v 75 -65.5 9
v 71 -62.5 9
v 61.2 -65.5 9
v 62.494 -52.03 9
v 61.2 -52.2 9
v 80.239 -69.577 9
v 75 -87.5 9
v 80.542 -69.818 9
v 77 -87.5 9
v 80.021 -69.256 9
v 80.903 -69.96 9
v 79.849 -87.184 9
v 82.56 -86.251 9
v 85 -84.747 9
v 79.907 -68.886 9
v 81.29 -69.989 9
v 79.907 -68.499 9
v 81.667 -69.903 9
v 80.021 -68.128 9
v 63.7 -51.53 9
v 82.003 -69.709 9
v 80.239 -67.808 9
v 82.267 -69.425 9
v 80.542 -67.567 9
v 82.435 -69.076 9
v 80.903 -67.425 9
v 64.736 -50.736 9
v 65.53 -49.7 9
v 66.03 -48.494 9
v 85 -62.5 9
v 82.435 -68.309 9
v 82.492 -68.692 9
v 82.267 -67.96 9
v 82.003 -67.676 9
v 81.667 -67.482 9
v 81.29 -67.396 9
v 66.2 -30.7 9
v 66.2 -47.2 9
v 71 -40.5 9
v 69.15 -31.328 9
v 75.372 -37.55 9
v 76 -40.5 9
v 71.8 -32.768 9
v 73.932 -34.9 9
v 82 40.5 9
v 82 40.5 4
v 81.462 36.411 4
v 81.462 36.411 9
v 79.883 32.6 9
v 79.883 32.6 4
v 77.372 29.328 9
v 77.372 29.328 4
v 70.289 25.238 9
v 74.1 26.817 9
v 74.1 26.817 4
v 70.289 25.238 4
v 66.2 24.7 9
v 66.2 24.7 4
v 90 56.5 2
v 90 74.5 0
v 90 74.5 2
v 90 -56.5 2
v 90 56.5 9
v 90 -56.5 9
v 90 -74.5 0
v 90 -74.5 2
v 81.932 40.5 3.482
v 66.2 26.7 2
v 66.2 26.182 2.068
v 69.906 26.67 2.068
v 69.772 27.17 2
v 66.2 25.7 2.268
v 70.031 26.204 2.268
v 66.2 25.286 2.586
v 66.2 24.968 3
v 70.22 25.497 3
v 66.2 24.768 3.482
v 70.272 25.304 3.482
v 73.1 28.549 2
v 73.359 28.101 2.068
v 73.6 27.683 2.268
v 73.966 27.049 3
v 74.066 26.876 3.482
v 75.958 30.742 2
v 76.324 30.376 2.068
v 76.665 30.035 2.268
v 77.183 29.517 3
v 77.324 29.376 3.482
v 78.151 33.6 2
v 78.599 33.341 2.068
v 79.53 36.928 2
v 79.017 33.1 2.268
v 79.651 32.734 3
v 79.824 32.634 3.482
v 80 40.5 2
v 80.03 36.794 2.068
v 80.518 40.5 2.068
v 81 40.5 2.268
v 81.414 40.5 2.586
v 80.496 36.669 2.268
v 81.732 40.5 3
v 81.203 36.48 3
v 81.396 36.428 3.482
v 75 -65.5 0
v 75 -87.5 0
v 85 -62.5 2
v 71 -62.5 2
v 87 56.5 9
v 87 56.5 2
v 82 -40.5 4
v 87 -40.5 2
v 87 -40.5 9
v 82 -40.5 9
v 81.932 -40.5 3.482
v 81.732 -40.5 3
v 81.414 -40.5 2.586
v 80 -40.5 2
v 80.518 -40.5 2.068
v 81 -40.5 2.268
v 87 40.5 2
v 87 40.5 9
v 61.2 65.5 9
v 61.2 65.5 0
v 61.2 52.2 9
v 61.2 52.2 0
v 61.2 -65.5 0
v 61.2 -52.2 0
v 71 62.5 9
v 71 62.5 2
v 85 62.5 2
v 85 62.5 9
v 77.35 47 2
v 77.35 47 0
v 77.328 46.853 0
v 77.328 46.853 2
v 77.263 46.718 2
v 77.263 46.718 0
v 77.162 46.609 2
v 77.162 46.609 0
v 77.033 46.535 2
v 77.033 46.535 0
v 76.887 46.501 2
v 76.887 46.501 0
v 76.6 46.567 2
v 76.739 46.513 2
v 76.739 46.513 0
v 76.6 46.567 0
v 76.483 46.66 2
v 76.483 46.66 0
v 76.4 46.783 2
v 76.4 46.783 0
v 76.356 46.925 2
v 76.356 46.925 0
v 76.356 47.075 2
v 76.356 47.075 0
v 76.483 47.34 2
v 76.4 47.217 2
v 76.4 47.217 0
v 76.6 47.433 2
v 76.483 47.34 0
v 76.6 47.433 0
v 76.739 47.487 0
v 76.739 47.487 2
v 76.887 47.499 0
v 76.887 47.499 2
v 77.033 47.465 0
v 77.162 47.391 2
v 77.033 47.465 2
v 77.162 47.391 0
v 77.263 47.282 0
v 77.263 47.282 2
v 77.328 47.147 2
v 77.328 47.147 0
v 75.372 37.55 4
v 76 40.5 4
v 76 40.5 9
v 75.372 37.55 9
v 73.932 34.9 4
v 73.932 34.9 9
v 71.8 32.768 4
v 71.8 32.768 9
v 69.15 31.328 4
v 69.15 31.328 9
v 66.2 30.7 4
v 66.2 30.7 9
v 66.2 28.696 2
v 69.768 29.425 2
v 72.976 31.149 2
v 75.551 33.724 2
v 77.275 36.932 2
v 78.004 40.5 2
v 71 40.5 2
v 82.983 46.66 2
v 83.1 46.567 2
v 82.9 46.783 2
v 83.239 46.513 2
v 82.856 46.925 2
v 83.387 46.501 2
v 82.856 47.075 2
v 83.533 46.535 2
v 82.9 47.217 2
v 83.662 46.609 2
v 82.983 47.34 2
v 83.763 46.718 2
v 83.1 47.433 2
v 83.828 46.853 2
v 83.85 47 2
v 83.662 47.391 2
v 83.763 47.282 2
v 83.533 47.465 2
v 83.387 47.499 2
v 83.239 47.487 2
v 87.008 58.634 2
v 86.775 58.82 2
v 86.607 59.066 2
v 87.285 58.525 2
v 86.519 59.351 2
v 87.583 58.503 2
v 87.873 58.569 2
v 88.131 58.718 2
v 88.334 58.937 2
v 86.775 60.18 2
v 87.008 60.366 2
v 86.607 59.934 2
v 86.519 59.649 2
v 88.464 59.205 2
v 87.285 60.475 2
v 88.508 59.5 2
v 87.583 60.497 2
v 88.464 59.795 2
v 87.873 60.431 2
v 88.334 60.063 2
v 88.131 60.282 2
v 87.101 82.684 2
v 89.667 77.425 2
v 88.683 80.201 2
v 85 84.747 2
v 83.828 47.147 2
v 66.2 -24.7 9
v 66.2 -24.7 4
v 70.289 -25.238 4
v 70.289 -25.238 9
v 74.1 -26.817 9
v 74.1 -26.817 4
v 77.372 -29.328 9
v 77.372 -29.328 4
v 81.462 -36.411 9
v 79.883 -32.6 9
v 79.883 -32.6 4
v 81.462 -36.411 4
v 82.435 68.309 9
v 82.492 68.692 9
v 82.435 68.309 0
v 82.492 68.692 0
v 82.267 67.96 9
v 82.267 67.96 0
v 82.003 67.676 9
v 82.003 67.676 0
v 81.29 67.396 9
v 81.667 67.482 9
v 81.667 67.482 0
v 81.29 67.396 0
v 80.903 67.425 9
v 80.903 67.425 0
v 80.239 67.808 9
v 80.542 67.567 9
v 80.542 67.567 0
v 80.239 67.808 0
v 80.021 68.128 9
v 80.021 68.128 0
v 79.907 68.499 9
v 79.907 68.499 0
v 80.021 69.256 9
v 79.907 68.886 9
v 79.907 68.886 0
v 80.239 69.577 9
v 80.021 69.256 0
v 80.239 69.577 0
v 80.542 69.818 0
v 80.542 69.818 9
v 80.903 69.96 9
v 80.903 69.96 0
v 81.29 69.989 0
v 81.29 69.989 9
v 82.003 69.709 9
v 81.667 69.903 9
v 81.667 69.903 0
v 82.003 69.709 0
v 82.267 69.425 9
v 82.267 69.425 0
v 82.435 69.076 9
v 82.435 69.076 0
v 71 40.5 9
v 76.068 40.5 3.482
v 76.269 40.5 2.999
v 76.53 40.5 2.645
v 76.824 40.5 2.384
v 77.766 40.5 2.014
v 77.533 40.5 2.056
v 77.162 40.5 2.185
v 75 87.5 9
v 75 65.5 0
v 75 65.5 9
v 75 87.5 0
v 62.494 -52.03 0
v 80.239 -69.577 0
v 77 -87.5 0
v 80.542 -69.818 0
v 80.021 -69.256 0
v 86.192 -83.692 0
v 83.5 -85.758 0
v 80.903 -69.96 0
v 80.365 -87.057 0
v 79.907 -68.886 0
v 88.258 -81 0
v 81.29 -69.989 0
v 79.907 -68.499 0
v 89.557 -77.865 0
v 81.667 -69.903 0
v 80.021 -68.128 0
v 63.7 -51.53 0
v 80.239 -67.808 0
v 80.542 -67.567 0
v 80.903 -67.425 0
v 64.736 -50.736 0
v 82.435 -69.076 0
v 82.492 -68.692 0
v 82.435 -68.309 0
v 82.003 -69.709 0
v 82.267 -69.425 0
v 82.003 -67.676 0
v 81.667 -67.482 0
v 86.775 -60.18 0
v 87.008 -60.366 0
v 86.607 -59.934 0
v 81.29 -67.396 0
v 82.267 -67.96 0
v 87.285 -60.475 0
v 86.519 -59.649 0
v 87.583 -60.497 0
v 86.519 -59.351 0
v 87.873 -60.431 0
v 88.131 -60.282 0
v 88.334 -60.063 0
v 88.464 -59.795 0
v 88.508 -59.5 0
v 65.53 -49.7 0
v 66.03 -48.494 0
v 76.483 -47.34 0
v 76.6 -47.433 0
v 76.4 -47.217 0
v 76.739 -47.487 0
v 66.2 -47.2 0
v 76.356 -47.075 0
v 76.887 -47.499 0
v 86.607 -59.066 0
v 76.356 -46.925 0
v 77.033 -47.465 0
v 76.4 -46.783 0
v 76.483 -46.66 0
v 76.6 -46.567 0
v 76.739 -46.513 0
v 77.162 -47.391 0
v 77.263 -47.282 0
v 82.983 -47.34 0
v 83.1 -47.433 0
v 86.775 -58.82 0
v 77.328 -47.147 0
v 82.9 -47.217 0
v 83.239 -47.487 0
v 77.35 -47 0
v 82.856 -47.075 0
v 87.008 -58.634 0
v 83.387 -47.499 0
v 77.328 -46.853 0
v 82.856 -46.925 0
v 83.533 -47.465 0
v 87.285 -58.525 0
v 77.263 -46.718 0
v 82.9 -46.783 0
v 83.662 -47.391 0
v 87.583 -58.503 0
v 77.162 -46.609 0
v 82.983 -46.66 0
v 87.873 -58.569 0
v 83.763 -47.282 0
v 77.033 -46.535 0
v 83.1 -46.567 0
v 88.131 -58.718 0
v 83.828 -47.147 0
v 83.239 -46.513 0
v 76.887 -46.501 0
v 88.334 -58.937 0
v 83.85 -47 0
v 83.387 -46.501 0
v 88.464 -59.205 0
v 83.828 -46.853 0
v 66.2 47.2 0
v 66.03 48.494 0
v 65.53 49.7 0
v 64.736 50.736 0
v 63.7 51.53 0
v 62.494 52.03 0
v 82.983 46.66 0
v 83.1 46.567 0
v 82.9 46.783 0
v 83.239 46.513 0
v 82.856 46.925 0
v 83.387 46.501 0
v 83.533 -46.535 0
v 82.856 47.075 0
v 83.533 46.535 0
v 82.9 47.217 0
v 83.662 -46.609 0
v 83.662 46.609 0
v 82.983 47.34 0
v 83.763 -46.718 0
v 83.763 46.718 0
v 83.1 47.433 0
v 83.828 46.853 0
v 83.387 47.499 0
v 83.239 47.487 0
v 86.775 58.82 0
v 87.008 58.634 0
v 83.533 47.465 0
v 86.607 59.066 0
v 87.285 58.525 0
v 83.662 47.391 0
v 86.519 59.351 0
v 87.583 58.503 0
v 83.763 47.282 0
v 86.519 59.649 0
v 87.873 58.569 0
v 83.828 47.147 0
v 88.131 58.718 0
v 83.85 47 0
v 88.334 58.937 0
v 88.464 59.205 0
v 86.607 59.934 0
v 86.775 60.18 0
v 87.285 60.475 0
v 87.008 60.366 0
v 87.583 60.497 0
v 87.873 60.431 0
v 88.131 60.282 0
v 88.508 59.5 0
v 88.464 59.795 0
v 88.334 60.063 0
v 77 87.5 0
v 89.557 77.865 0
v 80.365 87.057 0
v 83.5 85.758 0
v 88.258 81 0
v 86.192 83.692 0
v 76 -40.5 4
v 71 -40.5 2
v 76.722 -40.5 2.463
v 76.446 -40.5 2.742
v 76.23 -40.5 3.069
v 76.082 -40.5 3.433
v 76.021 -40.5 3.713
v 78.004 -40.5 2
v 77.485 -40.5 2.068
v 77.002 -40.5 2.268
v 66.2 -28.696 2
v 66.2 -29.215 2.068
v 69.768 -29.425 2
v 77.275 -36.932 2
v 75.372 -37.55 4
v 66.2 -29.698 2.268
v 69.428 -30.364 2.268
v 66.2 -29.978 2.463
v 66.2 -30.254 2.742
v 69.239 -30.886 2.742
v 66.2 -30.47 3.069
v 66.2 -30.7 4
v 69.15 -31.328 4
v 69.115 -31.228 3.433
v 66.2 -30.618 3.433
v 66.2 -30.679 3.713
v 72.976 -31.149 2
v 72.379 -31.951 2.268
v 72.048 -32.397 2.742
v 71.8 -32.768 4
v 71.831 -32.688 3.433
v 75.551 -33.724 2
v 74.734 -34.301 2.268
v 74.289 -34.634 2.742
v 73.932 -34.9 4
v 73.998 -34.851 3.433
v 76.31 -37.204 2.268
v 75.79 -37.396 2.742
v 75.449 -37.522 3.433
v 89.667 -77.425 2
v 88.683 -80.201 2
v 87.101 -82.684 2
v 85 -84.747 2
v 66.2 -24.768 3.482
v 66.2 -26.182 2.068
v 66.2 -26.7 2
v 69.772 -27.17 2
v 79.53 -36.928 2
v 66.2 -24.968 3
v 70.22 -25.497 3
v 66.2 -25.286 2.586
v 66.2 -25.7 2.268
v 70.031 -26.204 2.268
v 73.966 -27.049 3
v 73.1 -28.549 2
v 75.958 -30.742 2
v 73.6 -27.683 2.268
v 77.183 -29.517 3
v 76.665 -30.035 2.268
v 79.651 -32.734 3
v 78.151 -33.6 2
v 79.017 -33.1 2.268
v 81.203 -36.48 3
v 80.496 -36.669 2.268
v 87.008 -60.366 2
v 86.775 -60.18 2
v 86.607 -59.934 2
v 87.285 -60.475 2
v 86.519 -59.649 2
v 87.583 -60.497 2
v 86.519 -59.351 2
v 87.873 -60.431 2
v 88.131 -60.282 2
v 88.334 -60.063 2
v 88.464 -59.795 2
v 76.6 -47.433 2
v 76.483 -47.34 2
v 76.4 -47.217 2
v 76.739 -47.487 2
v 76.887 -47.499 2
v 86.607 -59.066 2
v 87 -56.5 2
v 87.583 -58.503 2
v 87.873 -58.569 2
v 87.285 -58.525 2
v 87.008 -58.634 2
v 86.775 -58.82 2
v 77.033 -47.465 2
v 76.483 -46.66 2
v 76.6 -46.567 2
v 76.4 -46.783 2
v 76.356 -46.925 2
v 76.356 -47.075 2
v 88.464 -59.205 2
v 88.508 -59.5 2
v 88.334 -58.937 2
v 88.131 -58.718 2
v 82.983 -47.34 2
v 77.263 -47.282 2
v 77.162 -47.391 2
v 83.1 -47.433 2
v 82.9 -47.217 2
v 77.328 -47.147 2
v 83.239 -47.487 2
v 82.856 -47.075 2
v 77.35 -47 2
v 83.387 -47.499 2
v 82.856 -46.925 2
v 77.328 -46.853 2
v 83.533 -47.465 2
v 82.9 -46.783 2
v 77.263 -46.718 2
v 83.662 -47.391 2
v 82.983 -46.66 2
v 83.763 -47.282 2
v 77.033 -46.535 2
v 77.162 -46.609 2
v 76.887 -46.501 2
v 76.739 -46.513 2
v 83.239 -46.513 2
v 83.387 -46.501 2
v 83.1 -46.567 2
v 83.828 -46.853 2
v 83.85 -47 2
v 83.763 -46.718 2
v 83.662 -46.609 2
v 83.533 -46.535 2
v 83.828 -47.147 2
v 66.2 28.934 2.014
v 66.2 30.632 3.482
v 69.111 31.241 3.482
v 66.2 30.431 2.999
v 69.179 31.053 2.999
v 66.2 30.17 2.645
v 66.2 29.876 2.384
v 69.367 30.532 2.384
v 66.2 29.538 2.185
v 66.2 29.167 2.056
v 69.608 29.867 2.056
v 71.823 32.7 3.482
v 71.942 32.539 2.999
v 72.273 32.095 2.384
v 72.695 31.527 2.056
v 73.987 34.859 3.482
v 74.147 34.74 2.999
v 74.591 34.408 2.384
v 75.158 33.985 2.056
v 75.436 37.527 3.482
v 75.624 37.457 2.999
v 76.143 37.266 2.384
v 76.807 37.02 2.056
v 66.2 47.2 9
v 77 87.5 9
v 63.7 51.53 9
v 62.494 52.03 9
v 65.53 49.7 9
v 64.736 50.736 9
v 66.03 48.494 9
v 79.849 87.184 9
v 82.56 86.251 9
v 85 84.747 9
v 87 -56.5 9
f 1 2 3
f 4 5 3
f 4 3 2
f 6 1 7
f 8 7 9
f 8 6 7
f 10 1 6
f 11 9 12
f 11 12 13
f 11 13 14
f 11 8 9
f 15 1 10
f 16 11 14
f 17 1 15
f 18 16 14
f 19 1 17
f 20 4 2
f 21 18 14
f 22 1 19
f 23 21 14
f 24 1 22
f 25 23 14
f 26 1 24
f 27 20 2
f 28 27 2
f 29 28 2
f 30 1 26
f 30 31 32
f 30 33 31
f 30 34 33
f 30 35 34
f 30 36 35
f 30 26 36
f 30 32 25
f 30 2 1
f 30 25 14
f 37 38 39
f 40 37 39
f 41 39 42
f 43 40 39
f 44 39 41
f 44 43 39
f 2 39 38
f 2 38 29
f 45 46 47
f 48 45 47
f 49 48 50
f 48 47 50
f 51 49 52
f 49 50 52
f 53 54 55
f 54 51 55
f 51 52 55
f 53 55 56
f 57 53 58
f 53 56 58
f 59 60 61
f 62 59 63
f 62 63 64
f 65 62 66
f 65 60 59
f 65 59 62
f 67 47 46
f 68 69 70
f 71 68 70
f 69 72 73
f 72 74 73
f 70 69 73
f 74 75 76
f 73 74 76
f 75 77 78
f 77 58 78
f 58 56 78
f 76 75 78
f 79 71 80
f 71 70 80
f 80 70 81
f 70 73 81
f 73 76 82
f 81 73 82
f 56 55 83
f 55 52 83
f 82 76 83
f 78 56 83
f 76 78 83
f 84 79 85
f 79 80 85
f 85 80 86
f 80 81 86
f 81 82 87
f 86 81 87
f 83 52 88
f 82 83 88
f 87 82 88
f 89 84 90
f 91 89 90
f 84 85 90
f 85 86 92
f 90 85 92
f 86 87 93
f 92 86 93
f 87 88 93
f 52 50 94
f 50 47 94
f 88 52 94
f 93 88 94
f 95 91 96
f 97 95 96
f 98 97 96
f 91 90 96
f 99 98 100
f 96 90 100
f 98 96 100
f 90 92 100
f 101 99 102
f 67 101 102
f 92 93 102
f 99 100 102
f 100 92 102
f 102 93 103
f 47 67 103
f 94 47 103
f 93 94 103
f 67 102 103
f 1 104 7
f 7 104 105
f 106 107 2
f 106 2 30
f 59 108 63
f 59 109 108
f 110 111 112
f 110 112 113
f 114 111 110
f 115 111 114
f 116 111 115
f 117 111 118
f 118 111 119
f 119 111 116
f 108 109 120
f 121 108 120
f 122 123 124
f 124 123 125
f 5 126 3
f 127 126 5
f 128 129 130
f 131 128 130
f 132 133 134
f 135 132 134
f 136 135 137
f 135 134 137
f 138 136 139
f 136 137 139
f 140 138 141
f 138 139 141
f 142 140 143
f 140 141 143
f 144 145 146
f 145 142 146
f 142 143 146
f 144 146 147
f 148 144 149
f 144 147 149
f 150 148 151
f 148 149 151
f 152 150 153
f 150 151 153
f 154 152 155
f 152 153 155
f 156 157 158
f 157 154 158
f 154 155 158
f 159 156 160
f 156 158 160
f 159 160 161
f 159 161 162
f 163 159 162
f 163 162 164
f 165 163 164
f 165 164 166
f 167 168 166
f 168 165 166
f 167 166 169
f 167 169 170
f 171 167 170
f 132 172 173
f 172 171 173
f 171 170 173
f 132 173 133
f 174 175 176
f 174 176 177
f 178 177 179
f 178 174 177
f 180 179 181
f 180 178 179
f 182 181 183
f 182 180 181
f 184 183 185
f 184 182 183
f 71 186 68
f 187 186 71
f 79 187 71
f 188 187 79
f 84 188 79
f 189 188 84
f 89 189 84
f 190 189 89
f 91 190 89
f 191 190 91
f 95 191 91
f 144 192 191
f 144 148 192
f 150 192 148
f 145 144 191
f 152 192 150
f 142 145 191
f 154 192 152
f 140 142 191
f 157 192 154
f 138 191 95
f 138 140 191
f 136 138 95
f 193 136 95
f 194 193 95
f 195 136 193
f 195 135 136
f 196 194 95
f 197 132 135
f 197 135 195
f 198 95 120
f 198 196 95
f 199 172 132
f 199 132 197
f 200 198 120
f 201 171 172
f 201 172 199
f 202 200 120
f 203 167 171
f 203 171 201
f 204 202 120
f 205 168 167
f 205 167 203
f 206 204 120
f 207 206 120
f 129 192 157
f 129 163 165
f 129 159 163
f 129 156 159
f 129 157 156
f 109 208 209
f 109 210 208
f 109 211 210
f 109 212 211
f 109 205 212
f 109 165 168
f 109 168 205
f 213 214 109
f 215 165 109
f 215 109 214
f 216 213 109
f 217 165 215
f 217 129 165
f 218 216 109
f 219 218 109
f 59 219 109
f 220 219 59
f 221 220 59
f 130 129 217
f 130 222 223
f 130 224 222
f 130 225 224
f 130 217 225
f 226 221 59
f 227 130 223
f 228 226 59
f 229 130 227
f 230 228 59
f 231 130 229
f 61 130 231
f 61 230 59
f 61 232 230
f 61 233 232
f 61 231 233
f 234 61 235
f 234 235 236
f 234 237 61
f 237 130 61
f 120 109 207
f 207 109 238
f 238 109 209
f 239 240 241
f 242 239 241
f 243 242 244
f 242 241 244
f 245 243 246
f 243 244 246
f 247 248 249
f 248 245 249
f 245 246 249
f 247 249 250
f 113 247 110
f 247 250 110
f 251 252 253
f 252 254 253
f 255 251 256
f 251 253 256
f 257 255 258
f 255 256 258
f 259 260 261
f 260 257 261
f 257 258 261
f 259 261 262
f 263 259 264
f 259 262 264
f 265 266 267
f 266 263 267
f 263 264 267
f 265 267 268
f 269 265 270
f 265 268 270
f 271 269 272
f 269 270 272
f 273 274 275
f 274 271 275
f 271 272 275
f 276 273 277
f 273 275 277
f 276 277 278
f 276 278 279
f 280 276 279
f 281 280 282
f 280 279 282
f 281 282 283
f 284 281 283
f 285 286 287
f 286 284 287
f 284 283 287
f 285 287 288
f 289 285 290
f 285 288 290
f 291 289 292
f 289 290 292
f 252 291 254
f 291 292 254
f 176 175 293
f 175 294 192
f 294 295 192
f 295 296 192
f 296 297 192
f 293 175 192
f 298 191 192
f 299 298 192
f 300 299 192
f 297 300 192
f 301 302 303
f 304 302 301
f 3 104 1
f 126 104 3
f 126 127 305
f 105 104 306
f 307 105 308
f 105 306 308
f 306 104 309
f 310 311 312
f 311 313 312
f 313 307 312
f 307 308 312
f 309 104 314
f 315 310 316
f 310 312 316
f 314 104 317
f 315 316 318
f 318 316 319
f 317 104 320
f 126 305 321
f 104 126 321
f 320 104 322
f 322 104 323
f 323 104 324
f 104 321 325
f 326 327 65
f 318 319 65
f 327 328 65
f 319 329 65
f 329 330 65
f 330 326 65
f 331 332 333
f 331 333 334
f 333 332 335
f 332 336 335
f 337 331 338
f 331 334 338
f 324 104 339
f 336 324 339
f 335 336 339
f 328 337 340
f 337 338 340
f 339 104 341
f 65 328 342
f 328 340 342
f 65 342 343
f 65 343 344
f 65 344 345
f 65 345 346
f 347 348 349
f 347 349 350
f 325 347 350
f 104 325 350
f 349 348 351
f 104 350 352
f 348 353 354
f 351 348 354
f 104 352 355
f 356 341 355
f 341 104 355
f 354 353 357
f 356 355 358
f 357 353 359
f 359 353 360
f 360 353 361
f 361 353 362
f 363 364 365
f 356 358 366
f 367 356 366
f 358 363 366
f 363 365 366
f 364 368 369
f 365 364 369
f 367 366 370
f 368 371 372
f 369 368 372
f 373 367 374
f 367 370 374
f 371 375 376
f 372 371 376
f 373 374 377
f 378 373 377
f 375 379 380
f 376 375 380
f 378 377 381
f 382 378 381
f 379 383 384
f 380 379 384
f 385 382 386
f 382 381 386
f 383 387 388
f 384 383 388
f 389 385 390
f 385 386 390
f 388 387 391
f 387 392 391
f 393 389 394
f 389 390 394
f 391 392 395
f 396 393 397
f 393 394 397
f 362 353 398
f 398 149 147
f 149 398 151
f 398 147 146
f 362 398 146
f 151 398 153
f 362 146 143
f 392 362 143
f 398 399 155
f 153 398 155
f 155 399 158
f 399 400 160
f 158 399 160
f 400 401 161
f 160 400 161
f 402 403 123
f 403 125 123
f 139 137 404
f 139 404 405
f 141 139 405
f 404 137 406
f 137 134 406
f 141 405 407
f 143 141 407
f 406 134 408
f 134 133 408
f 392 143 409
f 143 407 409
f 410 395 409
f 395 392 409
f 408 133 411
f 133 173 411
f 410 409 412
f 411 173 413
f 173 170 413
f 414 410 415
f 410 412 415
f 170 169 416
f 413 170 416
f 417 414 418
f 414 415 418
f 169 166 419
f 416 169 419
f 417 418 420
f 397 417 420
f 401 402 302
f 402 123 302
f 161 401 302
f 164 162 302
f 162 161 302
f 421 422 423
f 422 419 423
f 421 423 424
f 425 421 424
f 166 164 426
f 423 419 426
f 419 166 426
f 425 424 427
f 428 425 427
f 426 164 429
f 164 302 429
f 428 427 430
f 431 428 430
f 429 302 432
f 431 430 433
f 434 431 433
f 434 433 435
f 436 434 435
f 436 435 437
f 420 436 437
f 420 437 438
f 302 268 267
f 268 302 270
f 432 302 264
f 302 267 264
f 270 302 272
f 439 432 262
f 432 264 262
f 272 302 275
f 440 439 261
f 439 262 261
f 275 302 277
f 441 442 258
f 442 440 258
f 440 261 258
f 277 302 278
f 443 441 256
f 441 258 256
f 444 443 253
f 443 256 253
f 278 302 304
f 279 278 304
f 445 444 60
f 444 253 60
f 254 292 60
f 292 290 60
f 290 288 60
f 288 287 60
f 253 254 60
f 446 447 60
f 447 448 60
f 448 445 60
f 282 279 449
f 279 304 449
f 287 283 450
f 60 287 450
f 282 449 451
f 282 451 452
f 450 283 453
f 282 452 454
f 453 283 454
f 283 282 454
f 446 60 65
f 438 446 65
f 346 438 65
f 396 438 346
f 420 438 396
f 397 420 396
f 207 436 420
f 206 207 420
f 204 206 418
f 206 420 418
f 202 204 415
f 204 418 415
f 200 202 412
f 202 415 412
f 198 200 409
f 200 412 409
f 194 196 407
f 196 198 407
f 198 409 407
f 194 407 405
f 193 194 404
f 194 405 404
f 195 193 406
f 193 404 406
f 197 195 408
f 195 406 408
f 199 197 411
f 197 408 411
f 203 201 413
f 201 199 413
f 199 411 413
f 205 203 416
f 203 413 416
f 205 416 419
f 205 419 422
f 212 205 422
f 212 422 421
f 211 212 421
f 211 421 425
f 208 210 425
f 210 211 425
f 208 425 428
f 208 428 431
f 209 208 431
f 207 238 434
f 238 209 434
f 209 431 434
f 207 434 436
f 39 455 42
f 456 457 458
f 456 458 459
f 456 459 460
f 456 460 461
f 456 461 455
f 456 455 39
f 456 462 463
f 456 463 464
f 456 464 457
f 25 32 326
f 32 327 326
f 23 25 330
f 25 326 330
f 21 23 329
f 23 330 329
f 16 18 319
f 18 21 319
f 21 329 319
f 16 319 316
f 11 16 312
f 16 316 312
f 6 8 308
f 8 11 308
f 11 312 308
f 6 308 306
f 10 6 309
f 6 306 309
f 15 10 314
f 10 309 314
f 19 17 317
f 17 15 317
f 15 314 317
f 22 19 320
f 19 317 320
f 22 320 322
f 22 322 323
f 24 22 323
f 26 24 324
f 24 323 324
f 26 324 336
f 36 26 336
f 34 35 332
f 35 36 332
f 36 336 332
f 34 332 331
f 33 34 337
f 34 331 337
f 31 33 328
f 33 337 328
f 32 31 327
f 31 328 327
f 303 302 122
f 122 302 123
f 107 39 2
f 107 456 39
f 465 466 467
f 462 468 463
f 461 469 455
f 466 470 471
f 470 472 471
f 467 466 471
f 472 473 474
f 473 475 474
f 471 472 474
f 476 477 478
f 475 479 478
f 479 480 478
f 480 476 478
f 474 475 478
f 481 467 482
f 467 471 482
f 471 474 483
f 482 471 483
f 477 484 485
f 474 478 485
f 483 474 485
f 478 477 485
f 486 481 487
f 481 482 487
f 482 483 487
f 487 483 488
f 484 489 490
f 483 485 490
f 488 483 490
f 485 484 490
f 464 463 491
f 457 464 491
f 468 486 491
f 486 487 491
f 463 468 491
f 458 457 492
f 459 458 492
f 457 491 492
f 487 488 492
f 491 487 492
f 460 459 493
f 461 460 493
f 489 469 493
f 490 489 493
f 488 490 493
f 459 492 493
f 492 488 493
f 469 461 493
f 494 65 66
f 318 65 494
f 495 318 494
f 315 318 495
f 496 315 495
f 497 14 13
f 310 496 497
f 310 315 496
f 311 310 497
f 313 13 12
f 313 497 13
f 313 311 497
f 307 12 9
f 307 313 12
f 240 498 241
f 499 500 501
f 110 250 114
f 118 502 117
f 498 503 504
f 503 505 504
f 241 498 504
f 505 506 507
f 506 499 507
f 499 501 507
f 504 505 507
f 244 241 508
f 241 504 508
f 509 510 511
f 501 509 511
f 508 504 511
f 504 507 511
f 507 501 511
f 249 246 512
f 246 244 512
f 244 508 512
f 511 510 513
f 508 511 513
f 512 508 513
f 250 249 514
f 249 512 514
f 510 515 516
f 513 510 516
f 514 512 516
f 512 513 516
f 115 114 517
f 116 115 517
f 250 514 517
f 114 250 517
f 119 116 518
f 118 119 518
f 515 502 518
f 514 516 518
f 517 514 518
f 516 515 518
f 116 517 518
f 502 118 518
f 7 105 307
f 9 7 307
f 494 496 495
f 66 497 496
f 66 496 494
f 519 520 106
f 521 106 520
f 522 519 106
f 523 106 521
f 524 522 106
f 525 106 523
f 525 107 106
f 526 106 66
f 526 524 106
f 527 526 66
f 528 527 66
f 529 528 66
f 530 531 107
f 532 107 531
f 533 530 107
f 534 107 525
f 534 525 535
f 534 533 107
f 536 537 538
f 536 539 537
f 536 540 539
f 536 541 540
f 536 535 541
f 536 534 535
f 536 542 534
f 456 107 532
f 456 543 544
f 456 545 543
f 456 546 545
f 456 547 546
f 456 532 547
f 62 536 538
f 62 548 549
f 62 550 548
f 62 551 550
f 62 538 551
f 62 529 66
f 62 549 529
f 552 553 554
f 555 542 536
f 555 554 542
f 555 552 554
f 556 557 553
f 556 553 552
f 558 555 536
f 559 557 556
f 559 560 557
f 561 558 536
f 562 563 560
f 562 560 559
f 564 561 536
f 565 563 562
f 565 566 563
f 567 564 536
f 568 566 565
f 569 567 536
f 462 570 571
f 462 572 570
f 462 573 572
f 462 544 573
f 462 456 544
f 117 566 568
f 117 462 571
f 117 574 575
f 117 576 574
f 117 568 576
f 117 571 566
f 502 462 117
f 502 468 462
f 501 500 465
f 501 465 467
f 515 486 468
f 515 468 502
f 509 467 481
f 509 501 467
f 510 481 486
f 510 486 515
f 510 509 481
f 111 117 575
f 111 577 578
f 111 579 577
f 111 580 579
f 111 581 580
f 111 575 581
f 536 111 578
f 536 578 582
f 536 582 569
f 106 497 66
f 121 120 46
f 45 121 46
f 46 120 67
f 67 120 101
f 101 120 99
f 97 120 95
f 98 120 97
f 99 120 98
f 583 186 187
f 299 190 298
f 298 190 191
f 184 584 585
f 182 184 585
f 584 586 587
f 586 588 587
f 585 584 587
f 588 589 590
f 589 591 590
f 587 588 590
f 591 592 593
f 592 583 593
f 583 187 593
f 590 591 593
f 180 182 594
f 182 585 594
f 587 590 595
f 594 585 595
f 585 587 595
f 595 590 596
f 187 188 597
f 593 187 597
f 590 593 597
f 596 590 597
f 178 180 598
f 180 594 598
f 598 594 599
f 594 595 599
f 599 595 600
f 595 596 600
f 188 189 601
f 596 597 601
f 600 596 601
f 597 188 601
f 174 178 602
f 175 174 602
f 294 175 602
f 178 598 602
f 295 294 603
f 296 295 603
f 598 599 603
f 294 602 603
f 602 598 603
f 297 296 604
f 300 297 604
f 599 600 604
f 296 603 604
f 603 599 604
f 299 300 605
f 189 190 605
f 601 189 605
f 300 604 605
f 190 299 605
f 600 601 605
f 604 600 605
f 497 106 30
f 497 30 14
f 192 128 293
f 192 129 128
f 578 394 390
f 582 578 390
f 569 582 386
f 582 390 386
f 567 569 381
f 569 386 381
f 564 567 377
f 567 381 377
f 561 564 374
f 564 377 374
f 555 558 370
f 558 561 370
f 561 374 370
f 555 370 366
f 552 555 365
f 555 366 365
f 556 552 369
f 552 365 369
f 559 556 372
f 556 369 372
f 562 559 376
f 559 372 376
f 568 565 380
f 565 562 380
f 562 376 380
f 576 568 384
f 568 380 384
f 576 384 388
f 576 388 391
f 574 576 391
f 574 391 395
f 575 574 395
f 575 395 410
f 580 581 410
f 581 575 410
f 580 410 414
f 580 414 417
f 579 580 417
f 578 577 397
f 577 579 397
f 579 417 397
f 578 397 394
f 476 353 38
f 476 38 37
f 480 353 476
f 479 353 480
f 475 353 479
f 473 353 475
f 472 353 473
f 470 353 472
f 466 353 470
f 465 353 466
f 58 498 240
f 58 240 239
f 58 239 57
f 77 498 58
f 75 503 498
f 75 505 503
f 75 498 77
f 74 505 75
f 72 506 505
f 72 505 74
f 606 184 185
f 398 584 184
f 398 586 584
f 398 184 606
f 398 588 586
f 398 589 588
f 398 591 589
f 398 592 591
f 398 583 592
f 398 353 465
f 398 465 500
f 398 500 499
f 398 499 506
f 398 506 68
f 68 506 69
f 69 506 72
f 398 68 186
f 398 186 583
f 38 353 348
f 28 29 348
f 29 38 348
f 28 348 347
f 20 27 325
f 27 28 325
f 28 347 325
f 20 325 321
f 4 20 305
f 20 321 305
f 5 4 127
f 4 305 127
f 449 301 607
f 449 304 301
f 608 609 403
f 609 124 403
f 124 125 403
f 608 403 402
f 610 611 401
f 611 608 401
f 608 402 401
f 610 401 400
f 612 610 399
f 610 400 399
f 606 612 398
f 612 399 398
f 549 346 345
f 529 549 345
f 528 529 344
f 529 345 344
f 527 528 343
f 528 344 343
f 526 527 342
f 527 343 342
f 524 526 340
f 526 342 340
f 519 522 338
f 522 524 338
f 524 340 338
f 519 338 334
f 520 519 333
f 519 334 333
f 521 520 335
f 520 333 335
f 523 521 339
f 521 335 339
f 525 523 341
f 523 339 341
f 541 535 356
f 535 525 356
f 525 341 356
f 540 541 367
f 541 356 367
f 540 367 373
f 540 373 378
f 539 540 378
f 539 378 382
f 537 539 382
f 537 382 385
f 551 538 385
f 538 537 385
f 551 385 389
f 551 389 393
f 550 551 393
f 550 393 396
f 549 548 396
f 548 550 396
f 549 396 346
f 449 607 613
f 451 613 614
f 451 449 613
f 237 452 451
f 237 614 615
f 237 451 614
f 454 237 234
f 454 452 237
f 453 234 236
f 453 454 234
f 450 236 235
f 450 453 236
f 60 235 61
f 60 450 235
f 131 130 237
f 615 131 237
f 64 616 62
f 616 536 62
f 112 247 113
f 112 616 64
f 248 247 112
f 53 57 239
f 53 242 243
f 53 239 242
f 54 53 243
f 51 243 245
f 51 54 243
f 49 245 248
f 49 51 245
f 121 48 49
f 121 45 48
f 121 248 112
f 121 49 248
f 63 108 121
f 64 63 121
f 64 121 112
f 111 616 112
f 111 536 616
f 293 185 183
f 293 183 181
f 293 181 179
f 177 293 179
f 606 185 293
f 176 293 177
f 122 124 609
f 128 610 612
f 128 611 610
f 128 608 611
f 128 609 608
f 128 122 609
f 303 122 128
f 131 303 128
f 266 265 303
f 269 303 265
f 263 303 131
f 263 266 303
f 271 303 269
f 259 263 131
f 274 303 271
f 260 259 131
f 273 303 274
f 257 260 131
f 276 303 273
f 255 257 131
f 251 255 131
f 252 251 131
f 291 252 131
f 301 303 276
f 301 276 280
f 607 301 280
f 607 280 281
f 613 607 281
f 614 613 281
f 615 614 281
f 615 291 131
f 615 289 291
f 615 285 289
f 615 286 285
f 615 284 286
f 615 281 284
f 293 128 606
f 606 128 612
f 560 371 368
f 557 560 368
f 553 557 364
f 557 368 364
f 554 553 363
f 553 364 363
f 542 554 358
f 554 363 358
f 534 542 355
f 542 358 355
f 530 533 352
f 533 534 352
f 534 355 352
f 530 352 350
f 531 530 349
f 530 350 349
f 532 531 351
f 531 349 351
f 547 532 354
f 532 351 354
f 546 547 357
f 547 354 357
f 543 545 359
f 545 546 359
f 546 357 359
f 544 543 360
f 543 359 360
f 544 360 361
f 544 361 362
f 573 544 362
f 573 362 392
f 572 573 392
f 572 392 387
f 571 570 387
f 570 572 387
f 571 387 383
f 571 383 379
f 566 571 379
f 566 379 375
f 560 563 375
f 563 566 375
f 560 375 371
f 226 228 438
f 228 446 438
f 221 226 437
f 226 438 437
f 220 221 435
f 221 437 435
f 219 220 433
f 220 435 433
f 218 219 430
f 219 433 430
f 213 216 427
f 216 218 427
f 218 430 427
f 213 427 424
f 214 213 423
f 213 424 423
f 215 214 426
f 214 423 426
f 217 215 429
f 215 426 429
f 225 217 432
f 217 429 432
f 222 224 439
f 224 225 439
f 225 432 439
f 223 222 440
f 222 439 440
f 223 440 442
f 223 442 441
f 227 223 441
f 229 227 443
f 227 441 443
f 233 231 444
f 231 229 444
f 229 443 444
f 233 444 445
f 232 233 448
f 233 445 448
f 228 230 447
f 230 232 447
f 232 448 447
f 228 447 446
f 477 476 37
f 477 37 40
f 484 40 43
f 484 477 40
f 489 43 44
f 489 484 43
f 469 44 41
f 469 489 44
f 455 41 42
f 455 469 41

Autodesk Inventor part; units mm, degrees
ref_plane "YZ Plane" through (0, 0, 0) normal (1, 0, 0) x (0, 1, 0)
ref_plane "XZ Plane" through (0, 0, 0) normal (0, 1, 0) x (-1, 0, 0)
ref_plane "XY Plane" through (0, 0, 0) normal (0, 0, 1) x (1, 0, 0)
sketch "Эскиз1" plane through (0, 0, 0) normal (0, 0, 1) x (1, 0, 0)
  line L0 (117.5766, 0) -> (-136.0871, 0) construction
  line L1 (0, 117.7947) -> (0, -152.0118) construction
  line L2 (0, 0) -> (90, 0) construction
  line L3 (65.2, 57.2) -> (61.2, 57.2) construction
  line L4 (65.2, 57.2) -> (65.2, 52.2) construction
  line L5 (75, 65.5) -> (75, 87.5)
  line L6 (75, 87.5) -> (77, 87.5)
  arc A0 (90, 74.5) -> (77, 87.5) centre (77, 74.5) ccw
  line L7 (90, 74.5) -> (90, 0)
  circle A1 centre (65.2, 57.2) radius 2.1
  circle A2 centre (81.1924, 78.6924) radius 2.1
  line L8 (90, 63.5) -> (90, 65.5)
  line L9 (75, 65.5) -> (61.2, 65.5)
  line L10 (66.2, 29.1) -> (66.2, 36.5)
  line L11 (66.2, 24.1) -> (66.2, 0)
  line L12 (66.2, 29.1) -> (66.2, 24.1)
  line L13 (71, 62.5) -> (71, 45.5)
  line L14 (71, 45.5) -> (71, 56.5)
  line L15 (87, 56.5) -> (87, 45.5)
  line L16 (87, 45.5) -> (74.2, 45.5)
  line L17 (74.2, 45.5) -> (74.2, 56.5)
  line L18 (74.2, 56.5) -> (87, 56.5)
  line L19 (87, 56.5) -> (87, 45.5)
  line L20 (87, 45.5) -> (87, 40.5)
  line L21 (87, 40.5) -> (71, 40.5)
  line L22 (71, 40.5) -> (71, 45.5)
  line L23 (87, 40.5) -> (79, 40.5)
  arc A3 (66.2, 24.7) -> (82, 40.5) centre (66.2, 40.5) ccw
  arc A4 (66.2, 30.7) -> (76, 40.5) centre (65.5077, 41.1923) ccw
  line L24 (80.6, 45.5) -> (83.35, 45.5)
  line L25 (83.35, 45.5) -> (76.85, 45.5)
  line L26 (74.2, 45.5) -> (73.7, 45.5)
  circle A5 centre (76.85, 47) radius 0.5
  circle A6 centre (83.35, 47) radius 0.5
  line L27 (87, 45.5) -> (87, 55.9)
  line L28 (65.2, -57.2) -> (61.2, -57.2) construction
  line L29 (65.2, -57.2) -> (65.2, -52.2) construction
  line L30 (75, -65.5) -> (75, -87.5)
  line L31 (75, -87.5) -> (77, -87.5)
  arc A7 (77, -87.5) -> (90, -74.5) centre (77, -74.5) ccw
  line L32 (90, -74.5) -> (90, 0)
  circle A8 centre (65.2, -57.2) radius 2.1
  circle A9 centre (81.1924, -78.6924) radius 2.1
  line L33 (90, -63.5) -> (90, -65.5)
  line L34 (75, -65.5) -> (61.2, -65.5)
  line L35 (71, -62.5) -> (71, -45.5)
  line L36 (71, -45.5) -> (71, -56.5)
  line L37 (87, -56.5) -> (87, -45.5)
  line L38 (87, -45.5) -> (74.2, -45.5)
  line L39 (74.2, -45.5) -> (74.2, -56.5)
  line L40 (74.2, -56.5) -> (87, -56.5)
  line L41 (87, -56.5) -> (87, -45.5)
  line L42 (87, -45.5) -> (87, -40.5)
  line L43 (87, -40.5) -> (71, -40.5)
  line L44 (71, -40.5) -> (71, -45.5)
  line L45 (87, -40.5) -> (79, -40.5)
  arc A10 (82, -40.5) -> (66.2, -24.7) centre (66.2, -40.5) ccw
  arc A11 (76, -40.5) -> (66.2, -30.7) centre (65.5077, -41.1923) ccw
  line L46 (80.6, -45.5) -> (83.35, -45.5)
  line L47 (83.35, -45.5) -> (76.85, -45.5)
  line L48 (74.2, -45.5) -> (73.7, -45.5)
  circle A12 centre (76.85, -47) radius 0.5
  circle A13 centre (83.35, -47) radius 0.5
  line L49 (87, -45.5) -> (87, -55.9)
  line L50 (87, -56.5) -> (90, -56.5)
  circle A14 centre (87.508, -59.5) radius 1
  circle A15 centre (81.1924, 68.6924) radius 1.3
  circle A16 centre (81.1924, -68.6924) radius 1.3
  line L51 (61.2, 65.5) -> (61.2, 52.2)
  arc A17 (66.2, 47.2) -> (61.2, 52.2) centre (61.2, 47.2) ccw
  line L52 (66.2, 47.2) -> (66.2, 36.5)
  line L53 (66.2, -29.1) -> (66.2, -36.5)
  line L54 (66.2, -24.1) -> (66.2, 0)
  line L55 (66.2, -29.1) -> (66.2, -24.1)
  line L56 (61.2, -65.5) -> (61.2, -52.2)
  arc A18 (61.2, -52.2) -> (66.2, -47.2) centre (61.2, -47.2) ccw
  line L57 (66.2, -47.2) -> (66.2, -36.5)
  line L58 (85, -68.6924) -> (85, -84.747)
  line L59 (71, -62.5) -> (85, -62.5)
  line L60 (85, -62.5) -> (85, -68.6924)
  circle A19 centre (87.508, 59.5) radius 1
  line L61 (85, 68.6924) -> (85, 84.747)
  line L62 (71, 62.5) -> (85, 62.5)
  line L63 (85, 62.5) -> (85, 68.6924)
  line L64 (87, 56.5) -> (90, 56.5)
  point P0 (60.2, 65.5)
  point P1 (74.2, 55.9)
  point P2 (87, 82.8066)
  point P3 (60.2, -65.5)
  point P4 (74.2, -55.9)
  point P5 (87, -82.8066)
  point P6 (81.1924, 67.6924)
  point P7 (81.1924, -67.6924)
  point P8 (87.75, -59.5)
  dimension "d6" = 90
  dimension "d11" = 4
  dimension "d12" = 5
  dimension "d14" = 13
  dimension "d20" = 4.2
  dimension "d64" = 7.4
  dimension "d76" = 16
  dimension "d77" = 17
  dimension "d78" = 11
  dimension "d79" = 12.8
  dimension "d80" = 5
  dimension "d81" = 8
  dimension "d88" = 0.5
  dimension "d92" = 10.4
  dimension "d105" = 2.6
  dimension "d122" = 1
  dimension "d123" = 1
  dimension "d124" = 1
extrude "Выдавливание13" add sketch "Эскиз1" along normal blind 9 contours L5 L6 A0 L61 L63 L62 L13 L22 L21 A4 L10 L52 A17 L51 L9 | L7 L32 L50 L37 L42 L43 A10 L55 L54 L11 L12 A3 L21 L20 L15 L64 | A7 L31 L30 L34 L56 A18 L57 L53 A11 L43 L44 L35 L59 L60 L58 | A1 | A2 | A8 | A9
extrude "Выдавливание16" add sketch "Эскиз1" along normal blind 2 contours A0 L7 L64 L18 L17 L16 L20 L21 L22 L13 L62 L63 L61 | A4 L21 A3 L12 L10 | L15 L16 L17 L18 | L32 A7 L58 L60 L59 L35 L44 L43 L42 L38 L39 L40 L50 | L40 L39 L38 L37 | A10 L43 A11 L53 L55
fillet "Сопряжение3" radius 2 4 edges at (72.943, -33.757, 2) (77.3723, -29.3277, 2) (77.3723, 29.3277, 2) (72.943, 33.757, 2)
properties part number "front_part"
